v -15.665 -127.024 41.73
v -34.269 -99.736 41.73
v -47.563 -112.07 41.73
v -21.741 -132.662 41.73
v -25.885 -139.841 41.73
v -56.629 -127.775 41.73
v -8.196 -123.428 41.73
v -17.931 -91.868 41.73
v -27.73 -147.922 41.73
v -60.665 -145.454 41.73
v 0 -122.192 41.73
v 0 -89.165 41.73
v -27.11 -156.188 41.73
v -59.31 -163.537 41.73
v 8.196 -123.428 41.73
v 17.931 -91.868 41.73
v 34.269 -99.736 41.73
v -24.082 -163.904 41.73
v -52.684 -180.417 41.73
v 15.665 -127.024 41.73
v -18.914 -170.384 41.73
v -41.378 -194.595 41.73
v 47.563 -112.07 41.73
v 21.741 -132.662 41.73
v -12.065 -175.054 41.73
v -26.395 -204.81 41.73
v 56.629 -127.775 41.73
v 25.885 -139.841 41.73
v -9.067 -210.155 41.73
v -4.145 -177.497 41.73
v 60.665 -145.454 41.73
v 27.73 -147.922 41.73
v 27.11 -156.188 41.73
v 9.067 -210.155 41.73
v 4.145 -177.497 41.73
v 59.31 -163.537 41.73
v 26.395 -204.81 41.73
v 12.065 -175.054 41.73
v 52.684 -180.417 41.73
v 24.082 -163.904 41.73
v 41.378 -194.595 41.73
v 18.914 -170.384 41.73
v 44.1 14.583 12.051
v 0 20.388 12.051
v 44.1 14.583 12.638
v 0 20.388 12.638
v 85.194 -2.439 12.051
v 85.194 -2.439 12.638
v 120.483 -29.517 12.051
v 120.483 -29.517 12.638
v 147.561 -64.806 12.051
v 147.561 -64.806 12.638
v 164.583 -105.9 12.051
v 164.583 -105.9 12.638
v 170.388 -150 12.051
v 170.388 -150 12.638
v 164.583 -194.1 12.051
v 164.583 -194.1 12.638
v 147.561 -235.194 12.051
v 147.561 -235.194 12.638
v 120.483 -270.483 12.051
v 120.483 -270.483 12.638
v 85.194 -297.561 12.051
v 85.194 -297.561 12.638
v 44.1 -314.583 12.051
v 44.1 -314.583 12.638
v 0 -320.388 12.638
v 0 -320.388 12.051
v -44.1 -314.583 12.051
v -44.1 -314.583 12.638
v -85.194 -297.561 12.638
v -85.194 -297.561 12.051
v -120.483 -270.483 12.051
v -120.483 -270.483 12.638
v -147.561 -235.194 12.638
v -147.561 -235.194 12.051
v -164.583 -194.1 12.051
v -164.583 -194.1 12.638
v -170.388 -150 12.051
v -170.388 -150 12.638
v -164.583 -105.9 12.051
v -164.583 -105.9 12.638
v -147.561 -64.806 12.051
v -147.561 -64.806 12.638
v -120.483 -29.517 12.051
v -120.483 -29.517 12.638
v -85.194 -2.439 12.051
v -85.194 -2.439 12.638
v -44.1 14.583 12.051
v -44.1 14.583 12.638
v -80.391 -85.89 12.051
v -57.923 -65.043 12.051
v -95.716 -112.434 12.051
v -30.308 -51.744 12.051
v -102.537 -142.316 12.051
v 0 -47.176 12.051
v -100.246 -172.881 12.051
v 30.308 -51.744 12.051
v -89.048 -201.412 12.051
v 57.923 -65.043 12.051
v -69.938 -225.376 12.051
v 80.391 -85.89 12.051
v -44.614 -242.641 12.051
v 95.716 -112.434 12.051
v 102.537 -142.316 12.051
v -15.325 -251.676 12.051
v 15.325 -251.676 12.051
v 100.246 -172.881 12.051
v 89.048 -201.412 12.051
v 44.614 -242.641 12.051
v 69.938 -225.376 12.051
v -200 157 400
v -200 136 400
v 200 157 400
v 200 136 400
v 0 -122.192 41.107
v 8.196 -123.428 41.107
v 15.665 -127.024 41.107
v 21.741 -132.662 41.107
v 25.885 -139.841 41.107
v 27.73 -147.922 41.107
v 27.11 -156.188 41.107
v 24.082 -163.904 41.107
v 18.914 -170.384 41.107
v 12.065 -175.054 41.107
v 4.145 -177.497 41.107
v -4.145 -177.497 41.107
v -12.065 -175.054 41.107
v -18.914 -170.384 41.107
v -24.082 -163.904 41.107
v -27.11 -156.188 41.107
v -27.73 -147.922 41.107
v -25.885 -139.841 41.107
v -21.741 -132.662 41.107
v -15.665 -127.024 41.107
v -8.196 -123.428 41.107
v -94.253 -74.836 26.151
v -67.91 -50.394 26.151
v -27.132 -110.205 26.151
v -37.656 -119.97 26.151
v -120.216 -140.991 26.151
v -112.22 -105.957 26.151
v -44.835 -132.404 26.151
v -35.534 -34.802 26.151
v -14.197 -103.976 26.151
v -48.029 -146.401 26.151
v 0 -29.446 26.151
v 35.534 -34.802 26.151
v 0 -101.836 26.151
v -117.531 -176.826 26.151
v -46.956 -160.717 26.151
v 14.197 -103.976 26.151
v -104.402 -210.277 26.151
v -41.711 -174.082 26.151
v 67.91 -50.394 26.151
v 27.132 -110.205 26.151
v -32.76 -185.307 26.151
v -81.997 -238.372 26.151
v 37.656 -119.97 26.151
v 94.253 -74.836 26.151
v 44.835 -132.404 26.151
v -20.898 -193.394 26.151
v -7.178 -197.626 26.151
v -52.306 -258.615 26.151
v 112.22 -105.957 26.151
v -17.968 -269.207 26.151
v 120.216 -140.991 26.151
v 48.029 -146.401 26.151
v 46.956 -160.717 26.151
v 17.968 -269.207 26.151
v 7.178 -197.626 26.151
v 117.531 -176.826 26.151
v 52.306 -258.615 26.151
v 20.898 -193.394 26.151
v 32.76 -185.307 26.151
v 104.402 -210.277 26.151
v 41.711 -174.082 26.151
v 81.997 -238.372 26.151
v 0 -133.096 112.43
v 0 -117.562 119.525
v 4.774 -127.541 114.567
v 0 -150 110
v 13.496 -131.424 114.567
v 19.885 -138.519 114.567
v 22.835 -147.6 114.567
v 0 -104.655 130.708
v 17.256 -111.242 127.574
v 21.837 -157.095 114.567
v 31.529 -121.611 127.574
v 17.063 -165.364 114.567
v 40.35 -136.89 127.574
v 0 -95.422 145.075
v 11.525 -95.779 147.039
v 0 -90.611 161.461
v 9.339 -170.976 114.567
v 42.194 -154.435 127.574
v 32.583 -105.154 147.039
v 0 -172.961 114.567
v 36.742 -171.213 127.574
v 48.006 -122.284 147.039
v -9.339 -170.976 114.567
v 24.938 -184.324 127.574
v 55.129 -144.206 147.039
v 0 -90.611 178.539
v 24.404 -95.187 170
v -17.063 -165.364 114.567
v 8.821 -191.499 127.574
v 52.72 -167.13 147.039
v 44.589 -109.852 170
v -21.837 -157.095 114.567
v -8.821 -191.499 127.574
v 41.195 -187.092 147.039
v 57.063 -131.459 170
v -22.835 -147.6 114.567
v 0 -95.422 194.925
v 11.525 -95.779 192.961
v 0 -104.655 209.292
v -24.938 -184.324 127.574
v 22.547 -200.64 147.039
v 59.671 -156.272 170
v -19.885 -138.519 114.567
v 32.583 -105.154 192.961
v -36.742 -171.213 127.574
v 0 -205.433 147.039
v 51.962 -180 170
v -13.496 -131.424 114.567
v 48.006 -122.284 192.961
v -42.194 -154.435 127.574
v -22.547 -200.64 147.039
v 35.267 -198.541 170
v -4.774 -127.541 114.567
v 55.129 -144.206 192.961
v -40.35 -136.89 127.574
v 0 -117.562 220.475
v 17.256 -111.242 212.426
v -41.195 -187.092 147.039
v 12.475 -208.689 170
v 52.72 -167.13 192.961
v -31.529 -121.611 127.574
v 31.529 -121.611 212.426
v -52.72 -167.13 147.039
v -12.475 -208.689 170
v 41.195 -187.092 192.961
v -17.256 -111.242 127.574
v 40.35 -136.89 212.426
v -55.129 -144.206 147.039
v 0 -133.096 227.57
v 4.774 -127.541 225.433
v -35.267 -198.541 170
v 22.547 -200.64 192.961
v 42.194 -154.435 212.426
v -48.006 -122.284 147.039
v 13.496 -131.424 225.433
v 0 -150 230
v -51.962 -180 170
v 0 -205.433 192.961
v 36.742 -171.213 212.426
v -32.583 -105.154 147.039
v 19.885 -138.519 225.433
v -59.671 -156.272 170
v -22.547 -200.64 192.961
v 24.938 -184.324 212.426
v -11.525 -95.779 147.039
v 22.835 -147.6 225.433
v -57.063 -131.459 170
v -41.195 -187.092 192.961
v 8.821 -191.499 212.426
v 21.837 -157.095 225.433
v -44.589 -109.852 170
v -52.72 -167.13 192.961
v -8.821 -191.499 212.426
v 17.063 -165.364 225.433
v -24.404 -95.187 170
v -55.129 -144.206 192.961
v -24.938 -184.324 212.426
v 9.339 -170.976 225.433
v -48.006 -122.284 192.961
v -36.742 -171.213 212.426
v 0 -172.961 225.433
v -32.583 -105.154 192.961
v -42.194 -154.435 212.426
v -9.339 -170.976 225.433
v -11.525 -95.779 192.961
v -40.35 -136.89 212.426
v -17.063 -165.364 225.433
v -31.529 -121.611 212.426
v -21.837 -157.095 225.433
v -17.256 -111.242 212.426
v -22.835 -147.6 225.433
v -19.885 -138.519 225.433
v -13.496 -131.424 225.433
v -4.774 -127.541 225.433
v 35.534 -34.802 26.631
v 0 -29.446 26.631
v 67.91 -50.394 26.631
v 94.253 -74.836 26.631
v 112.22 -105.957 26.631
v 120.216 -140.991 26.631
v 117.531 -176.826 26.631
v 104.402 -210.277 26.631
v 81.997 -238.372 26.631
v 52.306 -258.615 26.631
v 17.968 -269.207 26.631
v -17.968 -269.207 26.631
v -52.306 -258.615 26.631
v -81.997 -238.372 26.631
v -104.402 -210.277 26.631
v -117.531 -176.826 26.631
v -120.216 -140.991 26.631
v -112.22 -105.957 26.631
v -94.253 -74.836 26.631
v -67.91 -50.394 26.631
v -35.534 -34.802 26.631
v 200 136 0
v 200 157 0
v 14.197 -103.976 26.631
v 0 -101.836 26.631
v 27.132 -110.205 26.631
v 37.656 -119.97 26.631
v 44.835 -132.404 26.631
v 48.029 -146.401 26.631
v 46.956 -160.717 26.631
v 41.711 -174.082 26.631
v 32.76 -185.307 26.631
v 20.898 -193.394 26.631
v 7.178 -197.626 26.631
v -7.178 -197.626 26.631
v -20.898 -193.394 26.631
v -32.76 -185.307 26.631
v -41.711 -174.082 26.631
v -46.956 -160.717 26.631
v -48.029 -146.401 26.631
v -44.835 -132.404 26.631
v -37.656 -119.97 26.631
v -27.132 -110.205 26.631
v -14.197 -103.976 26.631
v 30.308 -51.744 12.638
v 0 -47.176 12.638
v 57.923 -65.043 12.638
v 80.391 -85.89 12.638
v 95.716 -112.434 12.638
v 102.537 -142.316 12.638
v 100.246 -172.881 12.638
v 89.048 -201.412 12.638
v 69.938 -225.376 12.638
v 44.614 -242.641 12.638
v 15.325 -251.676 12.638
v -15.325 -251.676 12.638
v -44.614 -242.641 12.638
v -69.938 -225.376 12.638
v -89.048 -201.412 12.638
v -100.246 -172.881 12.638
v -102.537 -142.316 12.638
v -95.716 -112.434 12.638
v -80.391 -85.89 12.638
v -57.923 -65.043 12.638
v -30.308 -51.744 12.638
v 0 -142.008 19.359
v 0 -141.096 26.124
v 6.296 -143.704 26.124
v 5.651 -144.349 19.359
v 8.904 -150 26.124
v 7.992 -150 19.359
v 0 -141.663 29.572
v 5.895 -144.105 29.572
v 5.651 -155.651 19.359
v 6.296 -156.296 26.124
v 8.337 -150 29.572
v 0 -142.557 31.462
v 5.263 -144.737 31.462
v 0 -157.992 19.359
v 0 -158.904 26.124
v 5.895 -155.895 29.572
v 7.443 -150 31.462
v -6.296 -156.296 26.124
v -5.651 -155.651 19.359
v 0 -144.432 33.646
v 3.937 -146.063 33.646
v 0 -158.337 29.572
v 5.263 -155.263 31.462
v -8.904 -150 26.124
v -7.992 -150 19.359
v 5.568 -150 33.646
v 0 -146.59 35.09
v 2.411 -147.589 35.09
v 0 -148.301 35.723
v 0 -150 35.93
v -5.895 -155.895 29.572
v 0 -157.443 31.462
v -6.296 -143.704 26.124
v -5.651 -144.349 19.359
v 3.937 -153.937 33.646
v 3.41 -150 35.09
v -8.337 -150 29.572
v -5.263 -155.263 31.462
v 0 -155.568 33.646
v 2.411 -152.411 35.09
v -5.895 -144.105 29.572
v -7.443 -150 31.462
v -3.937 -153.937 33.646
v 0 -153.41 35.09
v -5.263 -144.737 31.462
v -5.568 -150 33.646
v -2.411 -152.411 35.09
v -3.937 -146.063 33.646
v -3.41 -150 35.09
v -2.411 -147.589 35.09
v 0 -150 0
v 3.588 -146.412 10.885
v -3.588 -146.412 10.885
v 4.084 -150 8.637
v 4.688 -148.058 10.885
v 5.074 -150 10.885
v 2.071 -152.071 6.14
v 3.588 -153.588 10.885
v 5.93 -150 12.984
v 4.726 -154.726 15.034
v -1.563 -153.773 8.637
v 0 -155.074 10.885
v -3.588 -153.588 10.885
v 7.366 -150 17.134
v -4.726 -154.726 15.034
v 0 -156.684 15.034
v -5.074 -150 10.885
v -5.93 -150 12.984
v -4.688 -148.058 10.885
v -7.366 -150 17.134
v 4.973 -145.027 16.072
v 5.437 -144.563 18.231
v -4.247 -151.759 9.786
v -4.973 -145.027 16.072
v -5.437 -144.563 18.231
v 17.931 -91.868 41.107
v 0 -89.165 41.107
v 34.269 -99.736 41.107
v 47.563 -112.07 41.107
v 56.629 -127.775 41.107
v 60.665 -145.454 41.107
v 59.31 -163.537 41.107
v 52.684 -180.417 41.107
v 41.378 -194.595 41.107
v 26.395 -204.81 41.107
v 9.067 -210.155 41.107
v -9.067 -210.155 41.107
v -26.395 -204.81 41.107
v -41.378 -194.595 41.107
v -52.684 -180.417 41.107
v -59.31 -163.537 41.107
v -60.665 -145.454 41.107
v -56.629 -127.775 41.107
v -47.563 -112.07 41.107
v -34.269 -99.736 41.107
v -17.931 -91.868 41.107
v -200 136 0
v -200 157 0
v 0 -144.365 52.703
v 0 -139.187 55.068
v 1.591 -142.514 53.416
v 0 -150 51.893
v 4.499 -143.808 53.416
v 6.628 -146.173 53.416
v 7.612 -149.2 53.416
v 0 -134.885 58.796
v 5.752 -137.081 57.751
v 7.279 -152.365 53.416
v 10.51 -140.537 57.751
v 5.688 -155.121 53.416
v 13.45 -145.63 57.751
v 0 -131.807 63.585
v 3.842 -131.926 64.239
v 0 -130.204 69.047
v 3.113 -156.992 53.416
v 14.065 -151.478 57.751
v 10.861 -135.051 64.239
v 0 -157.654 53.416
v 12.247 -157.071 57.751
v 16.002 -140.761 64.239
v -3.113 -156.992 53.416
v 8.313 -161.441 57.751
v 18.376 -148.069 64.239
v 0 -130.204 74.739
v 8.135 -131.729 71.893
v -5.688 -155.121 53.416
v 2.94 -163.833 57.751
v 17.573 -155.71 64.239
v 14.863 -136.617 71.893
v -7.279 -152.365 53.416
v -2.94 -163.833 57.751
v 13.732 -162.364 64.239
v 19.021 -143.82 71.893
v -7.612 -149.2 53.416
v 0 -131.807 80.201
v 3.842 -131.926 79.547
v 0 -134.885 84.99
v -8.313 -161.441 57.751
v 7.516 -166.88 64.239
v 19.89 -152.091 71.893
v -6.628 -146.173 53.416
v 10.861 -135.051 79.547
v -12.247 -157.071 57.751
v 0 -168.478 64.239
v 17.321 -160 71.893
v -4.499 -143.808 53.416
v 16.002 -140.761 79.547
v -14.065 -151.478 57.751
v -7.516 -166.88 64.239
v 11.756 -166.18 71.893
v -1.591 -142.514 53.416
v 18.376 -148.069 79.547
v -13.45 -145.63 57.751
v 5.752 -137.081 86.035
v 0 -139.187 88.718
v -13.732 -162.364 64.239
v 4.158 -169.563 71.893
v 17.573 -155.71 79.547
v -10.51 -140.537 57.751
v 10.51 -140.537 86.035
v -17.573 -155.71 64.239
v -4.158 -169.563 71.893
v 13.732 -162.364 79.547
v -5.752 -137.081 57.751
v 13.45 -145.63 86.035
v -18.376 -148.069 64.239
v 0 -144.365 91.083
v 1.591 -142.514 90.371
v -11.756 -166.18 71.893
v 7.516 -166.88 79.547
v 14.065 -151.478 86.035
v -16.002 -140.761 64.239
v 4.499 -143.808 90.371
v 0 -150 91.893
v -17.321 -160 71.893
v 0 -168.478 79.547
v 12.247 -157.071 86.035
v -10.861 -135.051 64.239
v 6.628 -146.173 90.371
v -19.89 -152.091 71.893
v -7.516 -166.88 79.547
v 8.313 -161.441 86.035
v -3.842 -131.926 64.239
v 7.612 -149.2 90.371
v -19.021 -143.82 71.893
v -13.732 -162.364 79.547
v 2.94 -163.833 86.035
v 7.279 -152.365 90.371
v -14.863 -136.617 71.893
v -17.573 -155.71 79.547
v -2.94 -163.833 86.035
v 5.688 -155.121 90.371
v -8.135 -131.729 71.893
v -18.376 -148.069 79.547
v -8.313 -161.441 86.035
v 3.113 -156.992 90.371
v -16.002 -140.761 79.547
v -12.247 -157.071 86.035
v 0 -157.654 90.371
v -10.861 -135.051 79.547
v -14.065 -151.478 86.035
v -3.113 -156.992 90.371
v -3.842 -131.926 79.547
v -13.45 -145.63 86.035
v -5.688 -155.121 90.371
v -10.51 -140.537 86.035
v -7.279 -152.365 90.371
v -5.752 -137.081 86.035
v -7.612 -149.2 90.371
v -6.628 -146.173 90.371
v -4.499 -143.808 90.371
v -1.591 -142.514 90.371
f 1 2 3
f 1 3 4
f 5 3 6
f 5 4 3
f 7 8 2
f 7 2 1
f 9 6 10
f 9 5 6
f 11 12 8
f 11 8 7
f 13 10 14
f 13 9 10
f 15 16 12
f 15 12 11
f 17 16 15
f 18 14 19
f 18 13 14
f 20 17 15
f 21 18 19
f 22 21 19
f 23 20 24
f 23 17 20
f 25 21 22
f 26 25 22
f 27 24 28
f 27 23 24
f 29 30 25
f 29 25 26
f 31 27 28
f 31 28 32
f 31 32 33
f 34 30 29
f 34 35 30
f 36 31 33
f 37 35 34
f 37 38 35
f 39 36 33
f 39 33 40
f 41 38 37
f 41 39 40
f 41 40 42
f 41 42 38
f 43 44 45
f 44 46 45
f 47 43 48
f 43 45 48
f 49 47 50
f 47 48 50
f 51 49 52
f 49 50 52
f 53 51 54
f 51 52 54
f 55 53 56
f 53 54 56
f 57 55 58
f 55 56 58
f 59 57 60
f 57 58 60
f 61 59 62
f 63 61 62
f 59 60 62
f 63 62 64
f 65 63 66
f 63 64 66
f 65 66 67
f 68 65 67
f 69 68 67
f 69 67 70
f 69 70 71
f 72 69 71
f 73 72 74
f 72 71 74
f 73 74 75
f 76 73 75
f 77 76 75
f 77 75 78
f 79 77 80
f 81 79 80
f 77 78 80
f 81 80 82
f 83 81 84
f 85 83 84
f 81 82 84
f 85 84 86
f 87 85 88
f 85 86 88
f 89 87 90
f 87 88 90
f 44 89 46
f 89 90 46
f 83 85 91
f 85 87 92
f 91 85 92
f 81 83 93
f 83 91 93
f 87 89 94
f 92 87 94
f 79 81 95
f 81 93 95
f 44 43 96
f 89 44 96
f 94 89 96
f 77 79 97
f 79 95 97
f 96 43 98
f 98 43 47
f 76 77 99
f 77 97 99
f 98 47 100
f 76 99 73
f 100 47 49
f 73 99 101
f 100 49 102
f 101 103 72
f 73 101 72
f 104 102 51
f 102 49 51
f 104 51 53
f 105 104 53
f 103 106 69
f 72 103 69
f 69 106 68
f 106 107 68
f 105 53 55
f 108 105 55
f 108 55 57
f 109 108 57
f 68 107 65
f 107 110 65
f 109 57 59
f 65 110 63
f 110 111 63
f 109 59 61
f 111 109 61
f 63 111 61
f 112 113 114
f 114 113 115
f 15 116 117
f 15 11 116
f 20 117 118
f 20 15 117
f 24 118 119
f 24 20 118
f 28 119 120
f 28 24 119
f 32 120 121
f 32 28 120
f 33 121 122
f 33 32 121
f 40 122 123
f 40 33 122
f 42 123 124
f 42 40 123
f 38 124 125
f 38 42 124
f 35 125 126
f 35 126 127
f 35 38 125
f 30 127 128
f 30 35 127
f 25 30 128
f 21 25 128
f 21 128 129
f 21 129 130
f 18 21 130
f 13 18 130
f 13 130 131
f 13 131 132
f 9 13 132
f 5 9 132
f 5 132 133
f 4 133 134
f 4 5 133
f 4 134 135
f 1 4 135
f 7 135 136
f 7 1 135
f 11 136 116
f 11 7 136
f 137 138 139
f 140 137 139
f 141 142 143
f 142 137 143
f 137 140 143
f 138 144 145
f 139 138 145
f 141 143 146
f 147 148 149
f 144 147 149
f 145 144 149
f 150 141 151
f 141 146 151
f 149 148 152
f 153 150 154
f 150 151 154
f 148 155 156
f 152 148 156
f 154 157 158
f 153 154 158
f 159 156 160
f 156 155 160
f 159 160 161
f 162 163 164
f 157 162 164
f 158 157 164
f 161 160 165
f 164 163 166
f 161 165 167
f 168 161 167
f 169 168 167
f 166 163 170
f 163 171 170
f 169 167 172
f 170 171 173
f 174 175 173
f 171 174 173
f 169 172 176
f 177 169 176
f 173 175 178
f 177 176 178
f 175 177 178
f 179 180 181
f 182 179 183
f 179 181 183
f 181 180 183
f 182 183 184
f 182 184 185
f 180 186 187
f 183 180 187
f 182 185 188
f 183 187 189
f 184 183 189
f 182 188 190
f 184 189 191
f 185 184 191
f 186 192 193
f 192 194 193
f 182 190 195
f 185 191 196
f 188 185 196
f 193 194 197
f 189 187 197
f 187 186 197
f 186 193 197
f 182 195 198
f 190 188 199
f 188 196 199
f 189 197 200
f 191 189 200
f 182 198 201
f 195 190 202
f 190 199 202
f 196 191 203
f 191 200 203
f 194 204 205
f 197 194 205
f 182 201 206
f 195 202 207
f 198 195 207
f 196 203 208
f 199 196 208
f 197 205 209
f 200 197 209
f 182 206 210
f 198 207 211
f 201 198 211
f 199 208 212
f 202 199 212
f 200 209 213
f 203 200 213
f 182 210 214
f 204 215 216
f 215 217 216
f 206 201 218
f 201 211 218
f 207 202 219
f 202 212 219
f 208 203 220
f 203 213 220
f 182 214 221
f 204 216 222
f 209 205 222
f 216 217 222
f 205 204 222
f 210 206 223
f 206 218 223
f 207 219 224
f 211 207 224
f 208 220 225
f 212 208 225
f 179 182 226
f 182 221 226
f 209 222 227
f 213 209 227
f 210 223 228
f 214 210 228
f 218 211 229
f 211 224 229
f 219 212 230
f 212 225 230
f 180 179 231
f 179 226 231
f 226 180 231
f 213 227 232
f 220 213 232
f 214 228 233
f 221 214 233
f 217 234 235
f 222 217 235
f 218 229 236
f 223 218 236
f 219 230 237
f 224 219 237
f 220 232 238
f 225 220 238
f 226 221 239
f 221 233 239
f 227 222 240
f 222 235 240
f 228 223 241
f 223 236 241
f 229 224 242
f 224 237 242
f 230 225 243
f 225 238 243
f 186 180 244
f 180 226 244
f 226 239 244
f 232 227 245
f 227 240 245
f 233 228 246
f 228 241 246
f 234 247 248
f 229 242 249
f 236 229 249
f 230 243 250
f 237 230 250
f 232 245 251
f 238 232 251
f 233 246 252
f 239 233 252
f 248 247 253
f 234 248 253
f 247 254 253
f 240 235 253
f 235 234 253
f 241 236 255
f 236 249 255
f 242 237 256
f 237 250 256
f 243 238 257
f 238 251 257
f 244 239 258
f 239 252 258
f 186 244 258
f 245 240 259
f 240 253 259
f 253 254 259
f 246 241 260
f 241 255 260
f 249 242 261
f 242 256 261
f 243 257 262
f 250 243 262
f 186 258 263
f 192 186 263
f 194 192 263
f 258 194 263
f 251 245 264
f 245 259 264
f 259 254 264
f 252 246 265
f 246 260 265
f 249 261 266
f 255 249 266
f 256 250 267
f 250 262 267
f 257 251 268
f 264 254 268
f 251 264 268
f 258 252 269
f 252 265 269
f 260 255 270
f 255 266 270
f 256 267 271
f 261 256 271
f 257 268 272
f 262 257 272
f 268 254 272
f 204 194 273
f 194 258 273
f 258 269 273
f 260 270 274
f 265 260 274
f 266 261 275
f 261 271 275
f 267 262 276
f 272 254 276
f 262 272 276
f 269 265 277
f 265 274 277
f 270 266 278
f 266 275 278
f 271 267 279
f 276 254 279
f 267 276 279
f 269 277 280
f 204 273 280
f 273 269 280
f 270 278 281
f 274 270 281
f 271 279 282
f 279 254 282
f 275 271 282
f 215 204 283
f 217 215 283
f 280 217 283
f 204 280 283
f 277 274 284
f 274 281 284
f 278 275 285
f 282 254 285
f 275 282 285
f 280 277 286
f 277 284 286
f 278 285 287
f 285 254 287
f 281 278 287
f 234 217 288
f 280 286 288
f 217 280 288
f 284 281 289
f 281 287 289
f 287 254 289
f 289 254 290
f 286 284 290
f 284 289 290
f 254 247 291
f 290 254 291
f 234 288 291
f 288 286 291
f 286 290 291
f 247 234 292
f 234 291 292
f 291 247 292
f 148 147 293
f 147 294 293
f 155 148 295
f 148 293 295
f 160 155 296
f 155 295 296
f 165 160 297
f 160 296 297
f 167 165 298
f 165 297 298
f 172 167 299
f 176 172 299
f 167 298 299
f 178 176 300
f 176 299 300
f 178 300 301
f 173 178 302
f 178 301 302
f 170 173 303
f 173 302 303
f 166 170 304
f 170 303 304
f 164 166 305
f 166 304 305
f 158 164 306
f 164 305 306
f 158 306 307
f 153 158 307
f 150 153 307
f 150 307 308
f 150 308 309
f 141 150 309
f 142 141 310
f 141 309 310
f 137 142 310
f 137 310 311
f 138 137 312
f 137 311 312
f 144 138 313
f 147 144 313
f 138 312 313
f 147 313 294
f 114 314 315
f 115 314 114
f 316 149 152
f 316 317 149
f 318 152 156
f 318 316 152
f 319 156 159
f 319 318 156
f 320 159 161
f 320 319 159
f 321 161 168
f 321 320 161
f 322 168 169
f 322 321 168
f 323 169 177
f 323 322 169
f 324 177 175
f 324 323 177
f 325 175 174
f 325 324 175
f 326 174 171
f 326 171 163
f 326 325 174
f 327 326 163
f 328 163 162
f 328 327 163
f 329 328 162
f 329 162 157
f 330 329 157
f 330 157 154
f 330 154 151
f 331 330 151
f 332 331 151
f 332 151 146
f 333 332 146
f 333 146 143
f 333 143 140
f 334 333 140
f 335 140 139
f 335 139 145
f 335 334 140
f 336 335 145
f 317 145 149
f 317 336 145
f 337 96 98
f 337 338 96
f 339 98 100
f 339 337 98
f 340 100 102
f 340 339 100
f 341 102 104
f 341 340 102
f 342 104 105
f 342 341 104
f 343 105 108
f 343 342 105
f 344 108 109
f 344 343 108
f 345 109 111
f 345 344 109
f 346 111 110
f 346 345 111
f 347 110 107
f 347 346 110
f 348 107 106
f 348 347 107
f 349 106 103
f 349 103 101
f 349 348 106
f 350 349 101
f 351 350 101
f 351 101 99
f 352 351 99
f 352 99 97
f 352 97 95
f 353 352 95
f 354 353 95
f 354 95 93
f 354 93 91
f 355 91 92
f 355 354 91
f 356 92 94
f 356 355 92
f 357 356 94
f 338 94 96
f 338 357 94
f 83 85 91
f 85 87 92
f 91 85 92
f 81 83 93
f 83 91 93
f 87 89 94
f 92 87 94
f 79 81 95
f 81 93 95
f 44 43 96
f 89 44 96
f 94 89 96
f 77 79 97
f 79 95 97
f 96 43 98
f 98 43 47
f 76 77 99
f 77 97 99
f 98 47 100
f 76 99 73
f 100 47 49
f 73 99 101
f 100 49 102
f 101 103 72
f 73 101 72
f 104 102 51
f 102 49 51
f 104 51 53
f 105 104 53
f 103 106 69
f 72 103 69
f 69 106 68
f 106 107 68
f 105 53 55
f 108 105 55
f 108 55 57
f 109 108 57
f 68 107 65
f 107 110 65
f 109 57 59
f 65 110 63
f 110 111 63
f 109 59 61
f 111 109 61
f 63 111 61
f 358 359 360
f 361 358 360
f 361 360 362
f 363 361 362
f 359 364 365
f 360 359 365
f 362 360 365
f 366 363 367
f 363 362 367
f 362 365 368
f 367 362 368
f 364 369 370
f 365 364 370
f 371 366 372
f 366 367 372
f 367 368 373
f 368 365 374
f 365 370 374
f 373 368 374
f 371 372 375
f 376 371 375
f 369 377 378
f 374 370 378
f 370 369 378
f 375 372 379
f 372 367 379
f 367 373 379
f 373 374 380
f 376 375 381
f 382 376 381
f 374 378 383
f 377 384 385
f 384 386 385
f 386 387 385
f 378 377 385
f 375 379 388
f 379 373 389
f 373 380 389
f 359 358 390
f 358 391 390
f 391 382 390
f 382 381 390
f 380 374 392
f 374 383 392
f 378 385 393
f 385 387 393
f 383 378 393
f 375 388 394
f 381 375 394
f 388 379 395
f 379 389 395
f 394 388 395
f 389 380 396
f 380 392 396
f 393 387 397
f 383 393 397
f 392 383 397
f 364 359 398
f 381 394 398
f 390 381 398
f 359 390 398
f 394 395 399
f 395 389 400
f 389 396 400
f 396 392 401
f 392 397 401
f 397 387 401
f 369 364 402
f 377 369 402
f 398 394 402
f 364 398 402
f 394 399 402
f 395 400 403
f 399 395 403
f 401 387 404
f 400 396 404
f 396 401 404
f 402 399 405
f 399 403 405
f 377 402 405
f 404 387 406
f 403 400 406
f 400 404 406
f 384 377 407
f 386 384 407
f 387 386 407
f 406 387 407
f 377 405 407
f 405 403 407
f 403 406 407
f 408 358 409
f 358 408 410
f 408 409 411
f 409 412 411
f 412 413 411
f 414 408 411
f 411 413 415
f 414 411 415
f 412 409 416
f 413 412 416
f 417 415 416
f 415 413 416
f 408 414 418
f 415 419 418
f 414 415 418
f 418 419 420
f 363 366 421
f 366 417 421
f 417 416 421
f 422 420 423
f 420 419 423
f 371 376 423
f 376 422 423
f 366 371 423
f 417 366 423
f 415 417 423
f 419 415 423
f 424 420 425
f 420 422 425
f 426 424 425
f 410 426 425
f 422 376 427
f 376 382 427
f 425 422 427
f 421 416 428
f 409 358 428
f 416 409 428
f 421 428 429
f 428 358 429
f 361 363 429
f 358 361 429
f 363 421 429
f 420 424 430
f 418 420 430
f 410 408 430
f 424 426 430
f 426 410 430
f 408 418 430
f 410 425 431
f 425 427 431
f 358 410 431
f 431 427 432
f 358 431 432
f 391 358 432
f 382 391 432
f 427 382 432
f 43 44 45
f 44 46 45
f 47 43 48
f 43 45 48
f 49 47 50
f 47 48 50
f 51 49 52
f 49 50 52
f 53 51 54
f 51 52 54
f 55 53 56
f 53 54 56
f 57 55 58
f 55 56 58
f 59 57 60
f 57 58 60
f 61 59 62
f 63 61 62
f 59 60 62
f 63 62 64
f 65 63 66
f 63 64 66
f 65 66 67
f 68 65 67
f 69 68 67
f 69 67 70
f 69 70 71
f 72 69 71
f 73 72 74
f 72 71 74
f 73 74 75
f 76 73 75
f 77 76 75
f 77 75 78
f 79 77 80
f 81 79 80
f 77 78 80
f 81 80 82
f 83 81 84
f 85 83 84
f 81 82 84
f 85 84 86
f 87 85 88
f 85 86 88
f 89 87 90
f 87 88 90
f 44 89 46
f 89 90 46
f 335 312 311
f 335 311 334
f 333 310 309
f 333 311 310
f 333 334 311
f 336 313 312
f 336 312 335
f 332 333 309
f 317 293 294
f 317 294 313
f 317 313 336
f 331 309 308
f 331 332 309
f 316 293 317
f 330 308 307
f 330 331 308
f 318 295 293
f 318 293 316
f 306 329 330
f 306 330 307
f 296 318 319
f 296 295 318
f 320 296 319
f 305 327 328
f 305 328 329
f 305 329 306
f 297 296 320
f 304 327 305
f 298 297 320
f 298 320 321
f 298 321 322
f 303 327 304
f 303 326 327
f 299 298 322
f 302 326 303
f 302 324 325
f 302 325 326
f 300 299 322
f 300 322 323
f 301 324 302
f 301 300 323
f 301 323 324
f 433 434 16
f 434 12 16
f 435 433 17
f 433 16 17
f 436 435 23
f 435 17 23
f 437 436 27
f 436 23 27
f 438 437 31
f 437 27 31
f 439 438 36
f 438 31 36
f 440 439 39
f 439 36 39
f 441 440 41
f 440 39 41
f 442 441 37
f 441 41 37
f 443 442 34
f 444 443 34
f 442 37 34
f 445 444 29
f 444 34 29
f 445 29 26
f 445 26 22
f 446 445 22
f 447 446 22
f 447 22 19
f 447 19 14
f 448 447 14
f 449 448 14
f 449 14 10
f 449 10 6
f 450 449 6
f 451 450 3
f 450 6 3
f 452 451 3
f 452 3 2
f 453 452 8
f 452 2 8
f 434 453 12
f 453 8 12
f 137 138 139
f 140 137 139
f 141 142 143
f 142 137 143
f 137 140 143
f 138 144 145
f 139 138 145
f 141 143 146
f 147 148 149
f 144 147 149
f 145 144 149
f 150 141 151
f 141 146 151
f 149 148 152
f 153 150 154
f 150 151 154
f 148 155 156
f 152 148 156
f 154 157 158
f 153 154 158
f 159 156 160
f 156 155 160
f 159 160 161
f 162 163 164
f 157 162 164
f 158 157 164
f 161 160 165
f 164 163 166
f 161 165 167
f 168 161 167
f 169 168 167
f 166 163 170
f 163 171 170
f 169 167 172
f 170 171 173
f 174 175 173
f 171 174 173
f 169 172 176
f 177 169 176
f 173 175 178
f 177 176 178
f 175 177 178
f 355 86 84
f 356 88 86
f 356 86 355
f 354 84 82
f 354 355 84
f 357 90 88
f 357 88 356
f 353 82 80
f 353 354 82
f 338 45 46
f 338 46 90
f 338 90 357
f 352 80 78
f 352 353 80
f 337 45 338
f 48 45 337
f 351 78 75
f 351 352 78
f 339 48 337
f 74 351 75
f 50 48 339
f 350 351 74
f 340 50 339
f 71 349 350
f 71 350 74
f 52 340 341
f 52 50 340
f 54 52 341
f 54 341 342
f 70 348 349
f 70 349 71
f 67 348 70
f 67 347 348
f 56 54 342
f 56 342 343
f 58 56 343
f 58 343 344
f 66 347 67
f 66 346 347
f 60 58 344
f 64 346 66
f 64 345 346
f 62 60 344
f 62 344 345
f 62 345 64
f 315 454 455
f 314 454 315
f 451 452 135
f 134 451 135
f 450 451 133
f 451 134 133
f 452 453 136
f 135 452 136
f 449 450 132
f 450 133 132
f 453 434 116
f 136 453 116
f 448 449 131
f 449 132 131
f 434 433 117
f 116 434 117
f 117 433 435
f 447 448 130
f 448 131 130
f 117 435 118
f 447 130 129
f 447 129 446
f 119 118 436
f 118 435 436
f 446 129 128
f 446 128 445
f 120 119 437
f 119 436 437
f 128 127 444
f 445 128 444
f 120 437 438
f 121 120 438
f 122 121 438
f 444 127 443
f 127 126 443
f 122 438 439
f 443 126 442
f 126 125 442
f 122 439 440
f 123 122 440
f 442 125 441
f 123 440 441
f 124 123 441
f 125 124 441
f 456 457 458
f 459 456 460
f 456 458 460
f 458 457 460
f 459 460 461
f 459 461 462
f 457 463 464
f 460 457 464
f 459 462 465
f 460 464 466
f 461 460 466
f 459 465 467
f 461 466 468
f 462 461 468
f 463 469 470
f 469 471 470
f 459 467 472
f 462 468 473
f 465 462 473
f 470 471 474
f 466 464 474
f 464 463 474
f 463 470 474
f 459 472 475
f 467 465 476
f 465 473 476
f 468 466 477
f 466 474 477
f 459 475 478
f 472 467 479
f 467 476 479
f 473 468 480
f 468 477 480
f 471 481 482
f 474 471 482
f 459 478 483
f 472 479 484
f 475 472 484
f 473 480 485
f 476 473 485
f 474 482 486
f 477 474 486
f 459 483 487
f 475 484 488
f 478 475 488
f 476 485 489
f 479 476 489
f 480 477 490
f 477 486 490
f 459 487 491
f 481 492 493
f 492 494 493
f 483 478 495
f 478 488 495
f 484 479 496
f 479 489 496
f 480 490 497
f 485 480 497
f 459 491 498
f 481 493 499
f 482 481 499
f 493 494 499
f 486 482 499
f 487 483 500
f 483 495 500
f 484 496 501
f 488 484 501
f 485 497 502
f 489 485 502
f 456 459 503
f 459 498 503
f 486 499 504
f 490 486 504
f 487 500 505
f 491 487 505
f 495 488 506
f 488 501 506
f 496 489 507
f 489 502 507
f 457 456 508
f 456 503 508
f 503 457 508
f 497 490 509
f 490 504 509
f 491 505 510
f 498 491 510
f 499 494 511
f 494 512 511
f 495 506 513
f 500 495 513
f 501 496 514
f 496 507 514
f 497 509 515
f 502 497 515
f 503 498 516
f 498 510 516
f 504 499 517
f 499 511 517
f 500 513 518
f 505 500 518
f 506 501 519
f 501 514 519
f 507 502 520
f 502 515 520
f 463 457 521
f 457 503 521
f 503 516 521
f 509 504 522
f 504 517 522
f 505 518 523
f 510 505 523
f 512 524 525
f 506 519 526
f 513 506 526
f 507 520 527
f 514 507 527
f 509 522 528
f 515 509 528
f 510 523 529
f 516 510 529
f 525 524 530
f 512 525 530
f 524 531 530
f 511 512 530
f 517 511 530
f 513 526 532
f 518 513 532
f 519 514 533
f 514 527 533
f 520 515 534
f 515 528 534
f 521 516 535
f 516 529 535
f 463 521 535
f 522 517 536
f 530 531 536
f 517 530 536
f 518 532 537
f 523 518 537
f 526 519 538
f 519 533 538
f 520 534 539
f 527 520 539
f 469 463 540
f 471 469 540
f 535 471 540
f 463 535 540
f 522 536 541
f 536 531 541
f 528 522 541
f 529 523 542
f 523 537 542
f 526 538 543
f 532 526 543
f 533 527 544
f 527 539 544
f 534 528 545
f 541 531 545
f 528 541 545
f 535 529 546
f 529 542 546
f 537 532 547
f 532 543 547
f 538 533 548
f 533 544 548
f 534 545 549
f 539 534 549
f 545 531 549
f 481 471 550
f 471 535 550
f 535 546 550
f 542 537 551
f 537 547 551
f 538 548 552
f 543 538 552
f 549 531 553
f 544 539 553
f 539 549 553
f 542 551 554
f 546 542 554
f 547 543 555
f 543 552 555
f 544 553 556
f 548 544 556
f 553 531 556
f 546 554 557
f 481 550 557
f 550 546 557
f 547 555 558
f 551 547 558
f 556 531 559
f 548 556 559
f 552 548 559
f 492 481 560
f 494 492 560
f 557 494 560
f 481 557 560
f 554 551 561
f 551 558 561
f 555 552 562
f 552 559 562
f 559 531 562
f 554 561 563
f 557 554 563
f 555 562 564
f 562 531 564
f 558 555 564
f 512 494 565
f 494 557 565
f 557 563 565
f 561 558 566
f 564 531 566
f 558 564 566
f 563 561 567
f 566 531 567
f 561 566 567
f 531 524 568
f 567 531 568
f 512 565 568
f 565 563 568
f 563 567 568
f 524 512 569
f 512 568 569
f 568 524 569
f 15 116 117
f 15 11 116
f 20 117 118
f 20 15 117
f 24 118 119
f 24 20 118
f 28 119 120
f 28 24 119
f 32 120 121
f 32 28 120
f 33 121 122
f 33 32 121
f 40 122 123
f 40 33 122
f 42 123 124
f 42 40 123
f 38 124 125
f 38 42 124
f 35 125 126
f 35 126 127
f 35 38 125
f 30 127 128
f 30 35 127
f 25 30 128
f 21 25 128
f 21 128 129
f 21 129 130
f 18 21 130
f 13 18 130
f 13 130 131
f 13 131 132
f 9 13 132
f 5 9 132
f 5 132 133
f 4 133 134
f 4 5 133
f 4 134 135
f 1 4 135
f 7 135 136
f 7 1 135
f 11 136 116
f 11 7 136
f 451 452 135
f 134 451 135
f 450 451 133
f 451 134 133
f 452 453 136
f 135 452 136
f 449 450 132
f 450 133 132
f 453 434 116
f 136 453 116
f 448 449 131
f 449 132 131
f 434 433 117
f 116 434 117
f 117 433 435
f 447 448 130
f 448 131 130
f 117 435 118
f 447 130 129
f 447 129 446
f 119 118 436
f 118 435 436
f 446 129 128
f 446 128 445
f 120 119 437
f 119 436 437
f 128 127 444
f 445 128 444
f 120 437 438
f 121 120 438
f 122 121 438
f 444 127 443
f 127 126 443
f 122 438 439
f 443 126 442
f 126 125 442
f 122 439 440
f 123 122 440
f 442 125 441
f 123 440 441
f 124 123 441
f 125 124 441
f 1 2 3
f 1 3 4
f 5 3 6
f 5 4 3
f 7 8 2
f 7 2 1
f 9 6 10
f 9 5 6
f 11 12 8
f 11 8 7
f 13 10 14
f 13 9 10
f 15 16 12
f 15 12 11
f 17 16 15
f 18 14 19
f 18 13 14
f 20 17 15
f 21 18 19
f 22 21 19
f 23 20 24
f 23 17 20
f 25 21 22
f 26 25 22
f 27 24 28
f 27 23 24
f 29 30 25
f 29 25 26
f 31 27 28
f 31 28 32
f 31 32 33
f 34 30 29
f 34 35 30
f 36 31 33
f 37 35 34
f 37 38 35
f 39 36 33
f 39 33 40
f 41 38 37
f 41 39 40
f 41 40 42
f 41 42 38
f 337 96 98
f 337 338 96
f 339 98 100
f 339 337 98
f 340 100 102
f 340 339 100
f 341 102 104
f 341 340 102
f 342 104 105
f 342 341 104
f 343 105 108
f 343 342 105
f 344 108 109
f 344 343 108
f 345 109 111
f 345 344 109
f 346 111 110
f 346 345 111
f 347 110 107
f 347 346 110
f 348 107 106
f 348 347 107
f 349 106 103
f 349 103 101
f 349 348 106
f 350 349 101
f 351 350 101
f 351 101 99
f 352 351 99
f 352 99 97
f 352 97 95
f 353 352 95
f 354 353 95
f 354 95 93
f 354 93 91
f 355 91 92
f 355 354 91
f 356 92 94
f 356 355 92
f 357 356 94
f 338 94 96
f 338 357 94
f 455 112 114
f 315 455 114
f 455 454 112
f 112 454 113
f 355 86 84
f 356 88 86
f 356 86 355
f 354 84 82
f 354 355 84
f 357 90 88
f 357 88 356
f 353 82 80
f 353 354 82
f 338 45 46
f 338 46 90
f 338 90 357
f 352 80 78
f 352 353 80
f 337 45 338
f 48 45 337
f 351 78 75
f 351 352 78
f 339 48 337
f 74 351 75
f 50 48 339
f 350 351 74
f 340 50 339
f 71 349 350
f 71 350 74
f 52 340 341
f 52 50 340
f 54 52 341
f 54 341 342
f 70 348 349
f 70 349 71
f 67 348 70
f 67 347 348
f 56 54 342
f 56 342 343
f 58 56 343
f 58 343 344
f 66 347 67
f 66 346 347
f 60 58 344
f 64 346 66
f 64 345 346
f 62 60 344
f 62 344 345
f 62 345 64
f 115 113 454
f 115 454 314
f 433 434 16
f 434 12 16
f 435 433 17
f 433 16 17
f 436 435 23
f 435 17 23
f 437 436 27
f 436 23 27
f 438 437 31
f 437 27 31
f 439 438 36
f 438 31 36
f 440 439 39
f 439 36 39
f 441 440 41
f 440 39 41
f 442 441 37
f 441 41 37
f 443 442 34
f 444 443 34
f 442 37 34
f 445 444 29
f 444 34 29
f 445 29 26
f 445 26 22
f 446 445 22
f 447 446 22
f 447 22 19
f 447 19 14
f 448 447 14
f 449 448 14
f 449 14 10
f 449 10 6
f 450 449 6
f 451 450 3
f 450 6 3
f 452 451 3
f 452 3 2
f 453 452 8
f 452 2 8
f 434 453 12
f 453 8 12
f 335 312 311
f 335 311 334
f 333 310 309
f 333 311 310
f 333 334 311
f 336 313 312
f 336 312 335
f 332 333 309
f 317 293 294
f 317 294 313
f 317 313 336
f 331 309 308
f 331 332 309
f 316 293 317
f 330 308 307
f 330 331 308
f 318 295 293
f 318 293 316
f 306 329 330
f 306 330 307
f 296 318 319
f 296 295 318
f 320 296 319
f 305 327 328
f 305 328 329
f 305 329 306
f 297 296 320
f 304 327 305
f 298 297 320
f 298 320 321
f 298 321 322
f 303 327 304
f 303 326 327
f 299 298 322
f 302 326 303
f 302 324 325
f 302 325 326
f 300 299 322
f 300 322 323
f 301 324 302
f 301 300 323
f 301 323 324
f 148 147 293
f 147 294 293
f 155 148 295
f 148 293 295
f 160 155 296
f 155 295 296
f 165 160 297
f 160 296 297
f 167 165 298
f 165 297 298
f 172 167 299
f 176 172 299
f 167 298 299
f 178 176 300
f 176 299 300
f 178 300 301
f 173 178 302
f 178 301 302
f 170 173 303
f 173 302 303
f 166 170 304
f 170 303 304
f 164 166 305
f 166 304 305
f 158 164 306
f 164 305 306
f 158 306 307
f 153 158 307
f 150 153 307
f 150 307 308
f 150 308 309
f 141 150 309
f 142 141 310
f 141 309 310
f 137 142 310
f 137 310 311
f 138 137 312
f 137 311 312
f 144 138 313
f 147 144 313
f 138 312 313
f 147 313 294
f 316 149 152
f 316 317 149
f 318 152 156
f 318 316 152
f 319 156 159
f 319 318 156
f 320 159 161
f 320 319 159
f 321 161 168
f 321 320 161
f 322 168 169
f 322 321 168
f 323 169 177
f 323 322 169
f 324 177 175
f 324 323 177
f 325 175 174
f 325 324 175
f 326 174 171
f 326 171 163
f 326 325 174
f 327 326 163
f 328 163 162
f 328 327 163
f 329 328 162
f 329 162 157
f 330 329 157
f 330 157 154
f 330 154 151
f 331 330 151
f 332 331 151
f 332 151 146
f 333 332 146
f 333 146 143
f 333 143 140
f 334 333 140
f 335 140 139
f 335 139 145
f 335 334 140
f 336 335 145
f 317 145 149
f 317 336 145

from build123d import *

# Parameters (mm, degrees)
F3_START = -136
F0_W     = 400
F0_H     = 400
F3_DEPTH = 21
F8_W     = 33.0270953653
F8_H     = 0.6231538645
F8_W_2   = 72.3895747283
F8_H_2   = 0.4799921252
F8_W_3   = 67.564117612
F8_H_3   = 0.5875171763


with BuildPart() as f2:
    # F1 (on Right) → F2 (revolve)
    with BuildSketch(Plane.YZ):
        with BuildLine():
            ThreePointArc((-150, 110), (-90, 170), (-150, 230))
            Line((-150, 230), (-150, 110))
        make_face()
    revolve(axis=Axis((0, -150, 170), (0, 0, -1)))


with BuildPart() as f3:
    # F0 (on Front) → F3 (new body)
    with BuildSketch(Plane.XZ.offset(F3_START)):
        with Locations((0, 200)):
            Rectangle(F0_W, F0_H)
    extrude(amount=-F3_DEPTH)


with BuildPart() as f5:
    # F4 (on Right) → F5 (revolve)
    with BuildSketch(Plane.YZ):
        with BuildLine():
            Line((-150, 35.9301567078), (-150, 0))
            add(Edge.make_bspline(
                [(-150, 0), (-146.0154275688, 8.3174599859), (-142.5858517401, 15.3278100745), (-139.3562522281, 31.009315122), (-147.0014429277, 35.9723562162), (-150, 35.9301567078)],
                knots=[0, 0, 0, 0, 0.3902849204, 0.7186010027, 1, 1, 1, 1], degree=3))
        make_face()
    revolve(axis=Axis((0, -150, 17.9650783539), (0, 0, -1)))


with BuildPart() as f7:
    # F6 (on Right) → F7 (revolve)
    with BuildSketch(Plane.YZ):
        with BuildLine():
            ThreePointArc((-150, 51.8931097289), (-130, 71.8931097289), (-150, 91.8931097289))
            Line((-150, 91.8931097289), (-150, 51.8931097289))
        make_face()
    revolve(axis=Axis((0, -150, 71.8931097289), (0, 0, -1)))


with BuildPart() as f9:
    # F8 (on Right) → F9 (revolve)
    with BuildSketch(Plane.YZ):
        with Locations((-105.6787731469, 41.418339388)):
            Rectangle(F8_W, F8_H)
    revolve(axis=Axis((0, -150, 23.9761587481), (0, 0, -1)))


with BuildPart() as f9b:
    # F8 (on Right) → F9, piece 2 (revolve)
    with BuildSketch(Plane.YZ):
        with Locations((-65.6412060954, 26.391093639)):
            Rectangle(F8_W_2, F8_H_2)
    revolve(axis=Axis((0, -150, 23.9761587481), (0, 0, -1)))


with BuildPart() as f9c:
    # F8 (on Right) → F9, piece 3 (revolve)
    with BuildSketch(Plane.YZ):
        with Locations((-13.3936369571, 12.3445154659)):
            Rectangle(F8_W_3, F8_H_3)
    revolve(axis=Axis((0, -150, 23.9761587481), (0, 0, -1)))


with BuildPart() as f10:
    # F8 (on Right) → F10 (revolve)
    with BuildSketch(Plane.YZ):
        with Locations((-105.6787731469, 41.418339388)):
            Rectangle(F8_W, F8_H)
    revolve(axis=Axis((0, -150, 17.9650783539), (0, 0, -1)))


with BuildPart() as f10b:
    # F8 (on Right) → F10, piece 2 (revolve)
    with BuildSketch(Plane.YZ):
        with Locations((-65.6412060954, 26.391093639)):
            Rectangle(F8_W_2, F8_H_2)
    revolve(axis=Axis((0, -150, 17.9650783539), (0, 0, -1)))


with BuildPart() as f10c:
    # F8 (on Right) → F10, piece 3 (revolve)
    with BuildSketch(Plane.YZ):
        with Locations((-13.3936369571, 12.3445154659)):
            Rectangle(F8_W_3, F8_H_3)
    revolve(axis=Axis((0, -150, 17.9650783539), (0, 0, -1)))


solid = Compound([f2.part, f3.part, f5.part, f7.part, f9.part, f9b.part, f9c.part, f10.part, f10b.part, f10c.part])
